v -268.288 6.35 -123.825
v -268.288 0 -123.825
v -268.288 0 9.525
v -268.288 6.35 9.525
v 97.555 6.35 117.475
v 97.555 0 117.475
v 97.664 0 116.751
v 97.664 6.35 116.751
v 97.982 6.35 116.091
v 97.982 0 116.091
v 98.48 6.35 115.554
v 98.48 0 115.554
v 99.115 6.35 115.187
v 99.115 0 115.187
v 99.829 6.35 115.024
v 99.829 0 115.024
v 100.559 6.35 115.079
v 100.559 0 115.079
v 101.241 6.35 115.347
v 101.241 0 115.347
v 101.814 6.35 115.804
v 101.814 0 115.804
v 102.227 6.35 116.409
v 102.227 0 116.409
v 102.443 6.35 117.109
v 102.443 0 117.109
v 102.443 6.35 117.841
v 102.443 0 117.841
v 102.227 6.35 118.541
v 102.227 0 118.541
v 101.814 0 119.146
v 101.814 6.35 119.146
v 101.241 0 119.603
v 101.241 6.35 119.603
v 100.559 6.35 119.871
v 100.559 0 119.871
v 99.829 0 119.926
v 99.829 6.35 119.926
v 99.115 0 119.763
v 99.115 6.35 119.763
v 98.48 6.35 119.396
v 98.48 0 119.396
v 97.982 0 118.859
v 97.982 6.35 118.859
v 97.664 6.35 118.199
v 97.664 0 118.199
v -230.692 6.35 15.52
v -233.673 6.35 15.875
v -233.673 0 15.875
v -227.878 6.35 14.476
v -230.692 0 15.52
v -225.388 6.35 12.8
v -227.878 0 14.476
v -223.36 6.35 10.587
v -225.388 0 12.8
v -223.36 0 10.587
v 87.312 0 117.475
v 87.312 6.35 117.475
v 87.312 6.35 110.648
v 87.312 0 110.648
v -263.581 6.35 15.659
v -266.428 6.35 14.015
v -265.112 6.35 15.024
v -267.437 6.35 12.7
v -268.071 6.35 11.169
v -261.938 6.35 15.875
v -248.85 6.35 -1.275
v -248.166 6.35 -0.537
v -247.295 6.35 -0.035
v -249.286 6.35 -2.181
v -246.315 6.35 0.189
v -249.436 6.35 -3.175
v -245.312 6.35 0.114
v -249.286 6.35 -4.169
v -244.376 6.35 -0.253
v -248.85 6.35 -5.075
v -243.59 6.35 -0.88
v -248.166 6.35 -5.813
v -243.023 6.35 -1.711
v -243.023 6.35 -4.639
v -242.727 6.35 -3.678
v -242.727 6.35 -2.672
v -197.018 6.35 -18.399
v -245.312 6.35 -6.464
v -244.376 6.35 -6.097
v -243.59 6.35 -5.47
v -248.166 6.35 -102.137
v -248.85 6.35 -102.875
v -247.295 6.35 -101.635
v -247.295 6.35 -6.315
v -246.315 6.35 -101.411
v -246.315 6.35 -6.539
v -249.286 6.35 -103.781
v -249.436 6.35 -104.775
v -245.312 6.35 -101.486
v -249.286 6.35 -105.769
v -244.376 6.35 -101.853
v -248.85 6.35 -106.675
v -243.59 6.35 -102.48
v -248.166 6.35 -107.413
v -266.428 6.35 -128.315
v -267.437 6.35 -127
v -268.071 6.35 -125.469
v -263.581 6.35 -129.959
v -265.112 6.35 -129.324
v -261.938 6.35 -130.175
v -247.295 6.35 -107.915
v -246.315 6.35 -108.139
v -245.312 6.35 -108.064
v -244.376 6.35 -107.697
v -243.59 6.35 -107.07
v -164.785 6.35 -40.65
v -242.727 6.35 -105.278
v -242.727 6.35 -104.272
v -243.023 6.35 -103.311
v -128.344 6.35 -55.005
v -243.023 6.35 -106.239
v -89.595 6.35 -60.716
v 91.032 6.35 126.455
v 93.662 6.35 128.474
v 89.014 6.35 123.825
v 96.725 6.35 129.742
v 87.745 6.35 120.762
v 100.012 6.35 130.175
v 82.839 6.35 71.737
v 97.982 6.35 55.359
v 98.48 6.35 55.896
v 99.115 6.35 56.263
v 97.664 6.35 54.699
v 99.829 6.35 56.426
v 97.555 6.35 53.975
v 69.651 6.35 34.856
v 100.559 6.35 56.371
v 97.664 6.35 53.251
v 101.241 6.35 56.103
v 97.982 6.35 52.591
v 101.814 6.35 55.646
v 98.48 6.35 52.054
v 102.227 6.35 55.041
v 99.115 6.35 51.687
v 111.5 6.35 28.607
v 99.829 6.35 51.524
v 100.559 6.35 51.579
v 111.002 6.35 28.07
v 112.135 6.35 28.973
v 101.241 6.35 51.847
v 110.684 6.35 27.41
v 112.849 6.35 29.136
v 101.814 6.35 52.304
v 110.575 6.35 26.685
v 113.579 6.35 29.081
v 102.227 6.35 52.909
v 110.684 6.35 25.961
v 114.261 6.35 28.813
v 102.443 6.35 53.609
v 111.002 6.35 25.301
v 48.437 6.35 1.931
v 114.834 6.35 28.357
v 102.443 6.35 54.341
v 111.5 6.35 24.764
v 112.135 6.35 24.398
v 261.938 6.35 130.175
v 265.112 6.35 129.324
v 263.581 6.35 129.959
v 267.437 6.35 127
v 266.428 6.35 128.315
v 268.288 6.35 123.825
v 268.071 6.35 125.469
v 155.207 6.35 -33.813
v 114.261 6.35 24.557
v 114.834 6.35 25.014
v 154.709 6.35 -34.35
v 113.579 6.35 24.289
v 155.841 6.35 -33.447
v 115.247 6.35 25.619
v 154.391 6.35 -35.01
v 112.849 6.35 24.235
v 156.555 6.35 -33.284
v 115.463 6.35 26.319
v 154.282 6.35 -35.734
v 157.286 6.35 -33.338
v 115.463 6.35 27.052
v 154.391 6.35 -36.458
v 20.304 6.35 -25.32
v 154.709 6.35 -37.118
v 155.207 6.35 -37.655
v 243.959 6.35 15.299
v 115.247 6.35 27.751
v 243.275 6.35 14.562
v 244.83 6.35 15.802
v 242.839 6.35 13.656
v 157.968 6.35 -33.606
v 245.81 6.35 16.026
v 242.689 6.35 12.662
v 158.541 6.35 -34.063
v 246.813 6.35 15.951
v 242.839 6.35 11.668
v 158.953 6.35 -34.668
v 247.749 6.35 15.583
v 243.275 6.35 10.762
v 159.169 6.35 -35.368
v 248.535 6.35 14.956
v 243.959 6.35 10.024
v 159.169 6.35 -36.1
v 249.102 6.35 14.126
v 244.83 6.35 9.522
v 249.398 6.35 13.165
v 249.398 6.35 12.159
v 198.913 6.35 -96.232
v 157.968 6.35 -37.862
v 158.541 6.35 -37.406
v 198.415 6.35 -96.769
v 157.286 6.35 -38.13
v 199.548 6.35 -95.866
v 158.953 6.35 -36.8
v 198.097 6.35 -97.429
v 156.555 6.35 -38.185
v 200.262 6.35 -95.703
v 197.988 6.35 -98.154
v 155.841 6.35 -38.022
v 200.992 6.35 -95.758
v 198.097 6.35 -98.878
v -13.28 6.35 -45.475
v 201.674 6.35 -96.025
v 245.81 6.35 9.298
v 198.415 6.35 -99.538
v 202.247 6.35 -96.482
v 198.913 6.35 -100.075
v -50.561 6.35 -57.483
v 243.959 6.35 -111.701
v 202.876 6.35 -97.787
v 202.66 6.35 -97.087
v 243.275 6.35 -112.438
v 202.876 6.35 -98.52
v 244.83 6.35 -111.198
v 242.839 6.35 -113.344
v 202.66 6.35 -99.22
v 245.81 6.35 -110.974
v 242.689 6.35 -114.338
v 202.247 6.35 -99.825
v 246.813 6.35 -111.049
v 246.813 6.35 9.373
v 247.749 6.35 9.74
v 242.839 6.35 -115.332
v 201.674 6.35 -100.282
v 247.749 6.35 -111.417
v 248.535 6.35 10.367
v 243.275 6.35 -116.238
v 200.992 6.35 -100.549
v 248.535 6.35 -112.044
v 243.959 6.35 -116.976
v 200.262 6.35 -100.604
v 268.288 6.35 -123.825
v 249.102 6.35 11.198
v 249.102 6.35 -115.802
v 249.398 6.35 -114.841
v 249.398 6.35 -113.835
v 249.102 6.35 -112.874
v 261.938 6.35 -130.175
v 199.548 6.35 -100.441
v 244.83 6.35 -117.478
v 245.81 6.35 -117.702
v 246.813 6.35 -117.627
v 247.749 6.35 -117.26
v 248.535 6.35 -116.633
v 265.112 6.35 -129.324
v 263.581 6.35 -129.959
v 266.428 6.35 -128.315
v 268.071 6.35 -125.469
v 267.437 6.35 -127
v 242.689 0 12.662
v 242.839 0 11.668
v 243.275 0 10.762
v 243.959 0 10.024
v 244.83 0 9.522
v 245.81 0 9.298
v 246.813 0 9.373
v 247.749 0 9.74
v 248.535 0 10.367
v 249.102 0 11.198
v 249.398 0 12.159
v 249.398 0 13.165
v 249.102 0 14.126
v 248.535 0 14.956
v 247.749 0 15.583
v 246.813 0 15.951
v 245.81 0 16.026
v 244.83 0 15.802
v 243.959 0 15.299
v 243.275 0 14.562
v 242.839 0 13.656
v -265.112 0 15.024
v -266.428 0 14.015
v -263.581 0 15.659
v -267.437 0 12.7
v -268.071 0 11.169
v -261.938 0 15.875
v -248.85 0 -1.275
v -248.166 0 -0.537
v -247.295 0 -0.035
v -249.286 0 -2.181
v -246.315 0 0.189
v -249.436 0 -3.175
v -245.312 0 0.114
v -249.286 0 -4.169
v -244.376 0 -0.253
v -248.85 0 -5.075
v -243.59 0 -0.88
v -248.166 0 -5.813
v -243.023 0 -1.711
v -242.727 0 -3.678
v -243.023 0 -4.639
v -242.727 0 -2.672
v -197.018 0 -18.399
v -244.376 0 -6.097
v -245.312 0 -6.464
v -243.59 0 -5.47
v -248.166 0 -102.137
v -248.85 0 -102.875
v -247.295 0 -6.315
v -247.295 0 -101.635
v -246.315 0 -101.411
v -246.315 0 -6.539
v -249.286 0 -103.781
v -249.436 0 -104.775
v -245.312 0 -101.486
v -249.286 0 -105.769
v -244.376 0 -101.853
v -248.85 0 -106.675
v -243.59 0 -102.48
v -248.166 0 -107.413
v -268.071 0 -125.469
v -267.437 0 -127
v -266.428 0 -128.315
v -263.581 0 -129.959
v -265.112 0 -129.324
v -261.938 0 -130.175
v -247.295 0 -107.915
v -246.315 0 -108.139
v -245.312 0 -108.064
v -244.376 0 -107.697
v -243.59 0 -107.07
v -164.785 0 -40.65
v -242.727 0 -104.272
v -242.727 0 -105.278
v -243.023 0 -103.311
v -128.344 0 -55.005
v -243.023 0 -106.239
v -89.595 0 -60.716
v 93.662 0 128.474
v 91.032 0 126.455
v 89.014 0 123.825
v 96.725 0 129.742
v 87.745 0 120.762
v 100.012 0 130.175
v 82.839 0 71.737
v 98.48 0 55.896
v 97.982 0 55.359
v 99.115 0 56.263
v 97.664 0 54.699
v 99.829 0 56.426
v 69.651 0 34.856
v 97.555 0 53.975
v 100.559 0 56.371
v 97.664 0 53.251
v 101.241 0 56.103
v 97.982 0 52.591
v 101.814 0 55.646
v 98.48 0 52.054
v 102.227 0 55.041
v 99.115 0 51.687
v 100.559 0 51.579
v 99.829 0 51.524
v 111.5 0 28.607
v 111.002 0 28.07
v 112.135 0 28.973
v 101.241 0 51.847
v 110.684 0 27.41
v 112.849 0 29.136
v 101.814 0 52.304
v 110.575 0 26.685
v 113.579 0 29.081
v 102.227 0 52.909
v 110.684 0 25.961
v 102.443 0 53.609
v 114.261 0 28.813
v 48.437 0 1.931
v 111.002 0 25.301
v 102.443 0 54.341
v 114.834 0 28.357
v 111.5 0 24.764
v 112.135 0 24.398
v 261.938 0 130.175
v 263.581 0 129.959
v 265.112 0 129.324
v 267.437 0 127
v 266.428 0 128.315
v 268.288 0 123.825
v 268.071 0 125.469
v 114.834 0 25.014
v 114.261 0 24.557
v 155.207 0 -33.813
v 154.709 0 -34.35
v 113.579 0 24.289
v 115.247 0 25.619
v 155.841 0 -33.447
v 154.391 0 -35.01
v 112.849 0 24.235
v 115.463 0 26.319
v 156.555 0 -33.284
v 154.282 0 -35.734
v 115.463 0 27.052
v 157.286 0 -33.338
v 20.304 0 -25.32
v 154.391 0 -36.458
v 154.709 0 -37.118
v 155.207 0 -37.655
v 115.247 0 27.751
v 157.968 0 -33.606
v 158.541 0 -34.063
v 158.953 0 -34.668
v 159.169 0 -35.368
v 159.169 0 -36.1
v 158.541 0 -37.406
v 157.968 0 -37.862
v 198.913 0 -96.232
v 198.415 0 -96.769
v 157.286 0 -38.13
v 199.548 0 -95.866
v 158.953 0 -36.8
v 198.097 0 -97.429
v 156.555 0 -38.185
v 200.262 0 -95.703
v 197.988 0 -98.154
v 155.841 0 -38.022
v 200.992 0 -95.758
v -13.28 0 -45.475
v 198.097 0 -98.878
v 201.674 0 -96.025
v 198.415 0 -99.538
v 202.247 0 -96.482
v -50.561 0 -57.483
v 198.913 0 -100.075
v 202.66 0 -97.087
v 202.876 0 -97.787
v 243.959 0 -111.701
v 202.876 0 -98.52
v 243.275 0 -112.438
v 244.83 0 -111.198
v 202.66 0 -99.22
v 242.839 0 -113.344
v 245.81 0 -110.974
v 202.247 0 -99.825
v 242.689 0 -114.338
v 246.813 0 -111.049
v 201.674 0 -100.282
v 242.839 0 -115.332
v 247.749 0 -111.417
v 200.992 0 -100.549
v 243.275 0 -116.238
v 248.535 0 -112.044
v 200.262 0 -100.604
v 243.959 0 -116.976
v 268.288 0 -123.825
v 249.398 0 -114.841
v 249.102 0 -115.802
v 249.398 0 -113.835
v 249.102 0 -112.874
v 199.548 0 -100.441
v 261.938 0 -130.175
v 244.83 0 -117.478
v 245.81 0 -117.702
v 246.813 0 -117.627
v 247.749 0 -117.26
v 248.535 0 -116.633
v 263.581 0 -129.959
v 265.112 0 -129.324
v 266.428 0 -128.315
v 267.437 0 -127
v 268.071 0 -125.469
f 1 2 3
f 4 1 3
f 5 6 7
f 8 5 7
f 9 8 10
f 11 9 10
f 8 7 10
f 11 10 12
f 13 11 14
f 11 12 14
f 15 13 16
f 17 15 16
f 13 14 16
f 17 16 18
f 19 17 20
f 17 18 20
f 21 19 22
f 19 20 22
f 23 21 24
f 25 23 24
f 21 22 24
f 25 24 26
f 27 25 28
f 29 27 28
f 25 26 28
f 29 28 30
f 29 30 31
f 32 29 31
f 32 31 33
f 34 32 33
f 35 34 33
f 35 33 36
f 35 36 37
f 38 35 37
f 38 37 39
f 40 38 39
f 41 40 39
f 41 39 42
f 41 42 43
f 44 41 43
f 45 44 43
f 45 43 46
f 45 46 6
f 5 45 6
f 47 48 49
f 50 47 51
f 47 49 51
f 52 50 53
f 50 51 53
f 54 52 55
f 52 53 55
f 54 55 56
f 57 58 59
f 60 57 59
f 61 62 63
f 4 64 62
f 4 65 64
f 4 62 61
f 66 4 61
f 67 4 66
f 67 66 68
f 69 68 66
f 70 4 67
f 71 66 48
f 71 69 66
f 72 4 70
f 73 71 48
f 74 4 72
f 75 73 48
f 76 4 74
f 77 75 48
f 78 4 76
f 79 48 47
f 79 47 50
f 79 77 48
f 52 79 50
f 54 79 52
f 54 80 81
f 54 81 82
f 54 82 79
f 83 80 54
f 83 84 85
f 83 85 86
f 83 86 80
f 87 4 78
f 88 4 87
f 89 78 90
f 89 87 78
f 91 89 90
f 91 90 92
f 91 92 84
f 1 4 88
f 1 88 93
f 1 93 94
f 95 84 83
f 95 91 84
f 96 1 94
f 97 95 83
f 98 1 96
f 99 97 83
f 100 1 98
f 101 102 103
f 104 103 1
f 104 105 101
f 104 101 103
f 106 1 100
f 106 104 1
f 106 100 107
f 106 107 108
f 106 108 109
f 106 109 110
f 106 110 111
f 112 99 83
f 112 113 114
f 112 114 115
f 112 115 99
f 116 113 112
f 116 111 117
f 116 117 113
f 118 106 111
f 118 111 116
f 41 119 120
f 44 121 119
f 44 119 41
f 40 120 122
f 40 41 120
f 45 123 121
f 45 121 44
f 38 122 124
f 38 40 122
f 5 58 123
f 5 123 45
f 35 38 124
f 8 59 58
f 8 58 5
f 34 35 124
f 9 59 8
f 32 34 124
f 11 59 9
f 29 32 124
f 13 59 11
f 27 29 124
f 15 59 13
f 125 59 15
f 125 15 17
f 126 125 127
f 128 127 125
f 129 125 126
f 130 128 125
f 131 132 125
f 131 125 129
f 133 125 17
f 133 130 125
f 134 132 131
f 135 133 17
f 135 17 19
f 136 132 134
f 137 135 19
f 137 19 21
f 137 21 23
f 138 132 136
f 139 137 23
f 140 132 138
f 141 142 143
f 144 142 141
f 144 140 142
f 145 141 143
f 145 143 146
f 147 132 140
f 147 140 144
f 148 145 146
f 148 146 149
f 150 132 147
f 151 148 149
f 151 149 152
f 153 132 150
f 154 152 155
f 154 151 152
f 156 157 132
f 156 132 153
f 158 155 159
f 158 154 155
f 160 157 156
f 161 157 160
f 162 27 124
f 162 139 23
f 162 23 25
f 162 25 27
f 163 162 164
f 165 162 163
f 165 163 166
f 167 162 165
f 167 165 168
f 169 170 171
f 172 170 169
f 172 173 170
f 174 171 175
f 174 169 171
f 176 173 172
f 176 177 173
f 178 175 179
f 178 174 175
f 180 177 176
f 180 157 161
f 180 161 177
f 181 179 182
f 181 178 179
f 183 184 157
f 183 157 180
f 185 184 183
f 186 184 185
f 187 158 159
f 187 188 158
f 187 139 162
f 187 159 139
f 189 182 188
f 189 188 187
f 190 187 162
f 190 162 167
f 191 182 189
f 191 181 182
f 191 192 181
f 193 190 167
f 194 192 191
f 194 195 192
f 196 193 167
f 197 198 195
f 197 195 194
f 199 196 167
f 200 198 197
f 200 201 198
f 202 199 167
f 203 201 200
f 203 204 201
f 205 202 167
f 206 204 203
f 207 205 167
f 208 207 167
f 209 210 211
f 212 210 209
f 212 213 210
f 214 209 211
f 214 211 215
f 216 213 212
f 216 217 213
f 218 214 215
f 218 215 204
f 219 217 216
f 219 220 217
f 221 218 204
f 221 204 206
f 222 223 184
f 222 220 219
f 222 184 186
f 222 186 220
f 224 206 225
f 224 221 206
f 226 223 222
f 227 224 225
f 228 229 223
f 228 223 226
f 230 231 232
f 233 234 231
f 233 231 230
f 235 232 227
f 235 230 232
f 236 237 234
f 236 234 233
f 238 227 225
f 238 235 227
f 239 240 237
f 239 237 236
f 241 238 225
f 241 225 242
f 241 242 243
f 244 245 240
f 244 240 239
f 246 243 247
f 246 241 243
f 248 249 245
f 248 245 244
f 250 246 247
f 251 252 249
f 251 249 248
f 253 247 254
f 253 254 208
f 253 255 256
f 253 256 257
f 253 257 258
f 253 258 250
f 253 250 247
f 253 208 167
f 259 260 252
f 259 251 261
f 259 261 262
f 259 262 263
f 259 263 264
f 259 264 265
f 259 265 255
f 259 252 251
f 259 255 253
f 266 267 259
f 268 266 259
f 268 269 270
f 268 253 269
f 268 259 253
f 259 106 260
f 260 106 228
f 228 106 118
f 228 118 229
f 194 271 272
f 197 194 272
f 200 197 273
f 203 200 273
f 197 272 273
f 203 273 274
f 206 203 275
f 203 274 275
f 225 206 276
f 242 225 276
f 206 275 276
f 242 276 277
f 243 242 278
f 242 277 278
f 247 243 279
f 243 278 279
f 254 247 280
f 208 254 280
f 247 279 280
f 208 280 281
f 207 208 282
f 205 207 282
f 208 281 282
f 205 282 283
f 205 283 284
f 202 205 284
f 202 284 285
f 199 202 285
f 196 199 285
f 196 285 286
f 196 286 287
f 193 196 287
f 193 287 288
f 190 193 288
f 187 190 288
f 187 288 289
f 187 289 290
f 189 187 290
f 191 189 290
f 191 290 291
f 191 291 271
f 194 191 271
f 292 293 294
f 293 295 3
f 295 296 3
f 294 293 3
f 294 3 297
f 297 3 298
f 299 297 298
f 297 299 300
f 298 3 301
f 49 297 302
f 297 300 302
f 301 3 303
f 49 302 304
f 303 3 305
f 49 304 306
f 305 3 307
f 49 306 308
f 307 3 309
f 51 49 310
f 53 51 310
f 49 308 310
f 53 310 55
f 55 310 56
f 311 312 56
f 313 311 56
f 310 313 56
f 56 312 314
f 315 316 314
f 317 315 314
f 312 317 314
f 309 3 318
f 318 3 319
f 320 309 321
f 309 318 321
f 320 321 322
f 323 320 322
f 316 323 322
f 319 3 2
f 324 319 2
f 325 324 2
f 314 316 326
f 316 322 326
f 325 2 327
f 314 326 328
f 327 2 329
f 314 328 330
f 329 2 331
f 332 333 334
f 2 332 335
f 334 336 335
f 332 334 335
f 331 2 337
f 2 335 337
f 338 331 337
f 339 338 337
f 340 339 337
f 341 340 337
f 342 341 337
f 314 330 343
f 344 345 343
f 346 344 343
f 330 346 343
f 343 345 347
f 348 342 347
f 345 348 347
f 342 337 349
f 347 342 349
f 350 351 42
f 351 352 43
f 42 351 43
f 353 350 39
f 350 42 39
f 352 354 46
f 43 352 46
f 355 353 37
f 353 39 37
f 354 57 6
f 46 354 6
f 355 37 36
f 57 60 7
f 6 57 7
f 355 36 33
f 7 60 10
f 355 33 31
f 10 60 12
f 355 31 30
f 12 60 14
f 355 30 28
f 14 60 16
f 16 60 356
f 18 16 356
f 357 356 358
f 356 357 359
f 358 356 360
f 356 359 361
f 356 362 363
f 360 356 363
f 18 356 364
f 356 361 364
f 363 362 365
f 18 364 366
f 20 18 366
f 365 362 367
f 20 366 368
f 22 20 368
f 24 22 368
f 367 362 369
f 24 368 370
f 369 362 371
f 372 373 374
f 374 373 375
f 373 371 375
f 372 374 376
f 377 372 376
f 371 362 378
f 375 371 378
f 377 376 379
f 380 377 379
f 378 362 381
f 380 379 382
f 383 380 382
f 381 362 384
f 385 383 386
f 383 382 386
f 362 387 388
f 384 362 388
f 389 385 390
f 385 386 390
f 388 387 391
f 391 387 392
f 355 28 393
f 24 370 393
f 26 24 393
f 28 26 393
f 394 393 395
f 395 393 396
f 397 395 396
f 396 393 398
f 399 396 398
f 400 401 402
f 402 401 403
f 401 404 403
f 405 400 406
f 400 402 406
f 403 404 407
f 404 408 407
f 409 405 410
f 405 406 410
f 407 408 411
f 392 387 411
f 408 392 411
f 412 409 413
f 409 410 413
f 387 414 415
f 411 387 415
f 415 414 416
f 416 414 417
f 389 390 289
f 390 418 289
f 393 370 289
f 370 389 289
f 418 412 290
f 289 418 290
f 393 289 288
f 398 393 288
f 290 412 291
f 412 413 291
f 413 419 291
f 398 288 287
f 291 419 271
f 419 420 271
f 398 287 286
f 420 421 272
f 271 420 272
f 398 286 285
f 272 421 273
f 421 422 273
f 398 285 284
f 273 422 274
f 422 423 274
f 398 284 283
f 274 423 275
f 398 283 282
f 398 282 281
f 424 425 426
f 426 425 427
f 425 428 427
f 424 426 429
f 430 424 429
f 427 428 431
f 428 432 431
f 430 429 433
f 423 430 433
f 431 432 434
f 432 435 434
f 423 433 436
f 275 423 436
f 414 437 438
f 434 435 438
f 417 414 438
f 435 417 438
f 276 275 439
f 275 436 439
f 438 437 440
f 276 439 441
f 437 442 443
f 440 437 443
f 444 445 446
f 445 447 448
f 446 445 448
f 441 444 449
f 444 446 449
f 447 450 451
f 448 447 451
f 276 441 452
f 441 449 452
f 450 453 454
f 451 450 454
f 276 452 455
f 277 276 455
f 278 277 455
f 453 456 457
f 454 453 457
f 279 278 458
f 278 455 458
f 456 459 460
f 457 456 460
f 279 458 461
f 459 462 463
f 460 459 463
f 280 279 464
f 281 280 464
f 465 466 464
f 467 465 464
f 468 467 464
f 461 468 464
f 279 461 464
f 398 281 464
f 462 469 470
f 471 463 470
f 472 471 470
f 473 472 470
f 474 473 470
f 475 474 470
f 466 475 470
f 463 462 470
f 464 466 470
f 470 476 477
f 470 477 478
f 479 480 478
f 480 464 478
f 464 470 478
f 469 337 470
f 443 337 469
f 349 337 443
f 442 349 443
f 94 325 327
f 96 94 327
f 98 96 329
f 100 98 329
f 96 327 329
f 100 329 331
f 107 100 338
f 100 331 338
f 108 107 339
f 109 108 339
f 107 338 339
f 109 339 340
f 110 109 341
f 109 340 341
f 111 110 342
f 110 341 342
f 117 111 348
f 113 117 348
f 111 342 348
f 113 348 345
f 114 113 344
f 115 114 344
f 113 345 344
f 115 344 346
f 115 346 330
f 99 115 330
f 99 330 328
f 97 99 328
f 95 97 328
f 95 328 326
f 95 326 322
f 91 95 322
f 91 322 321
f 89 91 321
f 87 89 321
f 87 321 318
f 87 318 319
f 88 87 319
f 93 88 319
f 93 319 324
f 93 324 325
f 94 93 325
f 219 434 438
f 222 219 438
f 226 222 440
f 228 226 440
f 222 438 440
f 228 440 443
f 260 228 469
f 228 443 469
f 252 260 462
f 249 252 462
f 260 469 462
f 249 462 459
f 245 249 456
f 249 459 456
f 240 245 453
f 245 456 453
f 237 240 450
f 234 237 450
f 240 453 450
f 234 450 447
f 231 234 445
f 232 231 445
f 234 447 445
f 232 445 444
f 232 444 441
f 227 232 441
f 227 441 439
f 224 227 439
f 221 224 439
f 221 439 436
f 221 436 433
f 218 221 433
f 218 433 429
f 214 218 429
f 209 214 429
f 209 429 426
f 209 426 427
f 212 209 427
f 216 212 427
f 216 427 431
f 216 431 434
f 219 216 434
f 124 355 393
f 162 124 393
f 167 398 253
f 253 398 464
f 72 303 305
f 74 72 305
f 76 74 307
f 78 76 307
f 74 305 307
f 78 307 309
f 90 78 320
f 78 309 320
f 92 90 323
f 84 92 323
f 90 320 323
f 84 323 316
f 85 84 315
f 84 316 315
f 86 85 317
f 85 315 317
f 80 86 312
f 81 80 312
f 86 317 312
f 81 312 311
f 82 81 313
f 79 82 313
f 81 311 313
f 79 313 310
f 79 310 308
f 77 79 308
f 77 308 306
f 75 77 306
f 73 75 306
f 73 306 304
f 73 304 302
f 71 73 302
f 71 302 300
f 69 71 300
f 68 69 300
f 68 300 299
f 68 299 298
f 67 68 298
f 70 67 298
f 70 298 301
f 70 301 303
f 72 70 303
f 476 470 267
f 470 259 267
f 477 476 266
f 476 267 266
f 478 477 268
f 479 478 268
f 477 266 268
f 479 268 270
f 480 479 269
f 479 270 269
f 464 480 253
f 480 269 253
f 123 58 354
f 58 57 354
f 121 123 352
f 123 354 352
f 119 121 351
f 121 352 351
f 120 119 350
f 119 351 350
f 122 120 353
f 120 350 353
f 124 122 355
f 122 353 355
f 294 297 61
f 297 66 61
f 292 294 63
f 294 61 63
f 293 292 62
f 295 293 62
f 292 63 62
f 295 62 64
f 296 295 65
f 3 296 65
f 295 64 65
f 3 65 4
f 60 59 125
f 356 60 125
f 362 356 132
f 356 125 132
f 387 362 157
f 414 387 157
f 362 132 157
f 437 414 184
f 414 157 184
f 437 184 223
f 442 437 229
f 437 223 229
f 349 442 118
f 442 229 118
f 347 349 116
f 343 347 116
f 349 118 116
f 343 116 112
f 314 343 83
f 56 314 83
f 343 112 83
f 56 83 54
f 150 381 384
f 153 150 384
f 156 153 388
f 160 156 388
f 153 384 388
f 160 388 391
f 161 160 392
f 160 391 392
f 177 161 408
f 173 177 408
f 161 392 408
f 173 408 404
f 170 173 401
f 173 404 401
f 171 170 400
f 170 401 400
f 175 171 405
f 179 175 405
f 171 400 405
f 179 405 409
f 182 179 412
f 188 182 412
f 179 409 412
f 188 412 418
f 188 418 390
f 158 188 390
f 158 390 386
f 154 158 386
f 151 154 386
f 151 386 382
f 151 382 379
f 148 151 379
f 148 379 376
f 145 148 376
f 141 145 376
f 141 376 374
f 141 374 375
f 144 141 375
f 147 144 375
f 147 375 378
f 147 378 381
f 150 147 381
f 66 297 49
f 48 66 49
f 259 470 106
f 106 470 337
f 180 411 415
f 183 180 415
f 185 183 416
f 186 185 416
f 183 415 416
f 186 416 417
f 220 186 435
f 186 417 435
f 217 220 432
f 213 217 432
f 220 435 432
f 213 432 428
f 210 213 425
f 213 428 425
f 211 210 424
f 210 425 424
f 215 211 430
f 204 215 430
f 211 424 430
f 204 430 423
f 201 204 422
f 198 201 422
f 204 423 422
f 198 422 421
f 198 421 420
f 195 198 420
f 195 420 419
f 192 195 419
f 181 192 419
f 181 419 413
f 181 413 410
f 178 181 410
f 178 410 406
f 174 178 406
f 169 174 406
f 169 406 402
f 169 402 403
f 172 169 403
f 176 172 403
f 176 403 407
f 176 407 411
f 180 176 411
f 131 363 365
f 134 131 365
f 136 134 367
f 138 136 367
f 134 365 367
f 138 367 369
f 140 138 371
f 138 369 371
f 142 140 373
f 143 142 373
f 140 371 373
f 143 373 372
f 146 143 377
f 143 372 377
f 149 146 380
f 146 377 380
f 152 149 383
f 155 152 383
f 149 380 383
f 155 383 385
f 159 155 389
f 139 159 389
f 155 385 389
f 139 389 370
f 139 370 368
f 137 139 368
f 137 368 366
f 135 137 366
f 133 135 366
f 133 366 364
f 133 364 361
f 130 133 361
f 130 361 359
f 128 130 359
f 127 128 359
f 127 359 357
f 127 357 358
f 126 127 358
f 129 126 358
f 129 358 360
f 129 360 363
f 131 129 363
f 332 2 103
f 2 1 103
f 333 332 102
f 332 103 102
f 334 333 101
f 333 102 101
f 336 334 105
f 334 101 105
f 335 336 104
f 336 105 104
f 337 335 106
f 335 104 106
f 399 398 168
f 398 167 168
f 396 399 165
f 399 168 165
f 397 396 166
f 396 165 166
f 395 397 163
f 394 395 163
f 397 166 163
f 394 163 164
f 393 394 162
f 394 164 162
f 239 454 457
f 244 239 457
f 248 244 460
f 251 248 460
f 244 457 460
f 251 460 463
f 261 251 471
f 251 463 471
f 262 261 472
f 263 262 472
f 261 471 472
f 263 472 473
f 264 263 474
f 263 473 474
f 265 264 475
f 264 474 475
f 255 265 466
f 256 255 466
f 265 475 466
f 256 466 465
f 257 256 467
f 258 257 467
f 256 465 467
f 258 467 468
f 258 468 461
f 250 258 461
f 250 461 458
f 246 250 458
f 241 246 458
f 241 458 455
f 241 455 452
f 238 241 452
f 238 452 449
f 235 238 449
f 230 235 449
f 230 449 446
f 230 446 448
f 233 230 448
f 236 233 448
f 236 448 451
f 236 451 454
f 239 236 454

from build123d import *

# Parameters (mm, degrees)
BOSS_EXTRUDE1_DEPTH              = 6.35
F_17_64_0_26563_DIAMETER_HOLE1_D = 6.747002
FILLET1_R                        = 6.35
F_10_0_1935_DIAMETER_HOLE1_D     = 4.9149
SKETCH8_R                        = 3.373501
CUT_EXTRUDE1_DEPTH               = 299.268395545
FILLET2_R                        = 12.7


with BuildPart() as part:
    # Sketch1 → Boss-Extrude1 (new body)
    with BuildSketch(Plane(origin=(0, 0, 0), x_dir=(1, 0, 0), z_dir=(0, 1, 0))):
        with BuildLine():
            Line((-268.2875, -15.875), (-233.3625, -15.875))
            ThreePointArc((-233.3625, -15.875), (-228.872371939, -17.734871939), (-227.0125, -22.225))
            Line((-227.0125, -22.225), (-227.0125, -130.175))
            Line((-227.0125, -130.175), (268.2875, -130.175))
            Line((268.2875, -130.175), (268.2875, 130.175))
            Line((268.2875, 130.175), (-268.2875, 130.175))
            Line((-268.2875, 130.175), (-268.2875, -15.875))
        make_face()
    extrude(amount=BOSS_EXTRUDE1_DEPTH)

    # 17/64 (0.26563) Diameter Hole1 (through all)
    with Locations(Plane(origin=(0, 6.35, 0), x_dir=(1, 0, 0), z_dir=(0, 1, 0))):
        with Locations((-246.0625, 104.775), (-246.0625, 3.175), (-220.6625, -53.975), (-220.6625, -117.475), (246.0625, 114.3381), (246.0625, -12.6619)):
            Hole(F_17_64_0_26563_DIAMETER_HOLE1_D / 2)

    # Fillet1
    fillet1_edges = [part.edges().sort_by_distance(p)[0] for p in [
        (268.2875, 3.175, 130.175),
        (-227.0125, 3.175, 130.175),
        (-268.2875, 3.175, 15.875),
        (-268.2875, 3.175, -130.175),
        (268.2875, 3.175, -130.175),
    ]]
    fillet(fillet1_edges, radius=FILLET1_R)

    # #10 (0.1935) Diameter Hole1 (through all)
    with Locations(Plane(origin=(0, 6.35, 0), x_dir=(1, 0, 0), z_dir=(0, 1, 0))):
        with Locations((200.4455889, 98.15353155), (156.73906445, 35.734145775), (113.03254, -26.68524), (100.0125, -53.975), (100.0125, -117.475)):
            Hole(F_10_0_1935_DIAMETER_HOLE1_D / 2)

    # Sketch8 → Cut-Extrude1 (cut, through all)
    with BuildSketch(Plane(origin=(0, 6.35, 0), x_dir=(1, 0, 0), z_dir=(0, 1, 0))):
        with BuildLine():
            Line((-220.6625, -130.175), (87.3125, -130.175))
            Line((87.3125, -130.175), (87.3125, -110.647553384))
            ThreePointArc((87.3125, -110.647553384), (-34.644148174, 53.50332424), (-227.0125, -15.875))
            Line((-227.0125, -15.875), (-233.3625, -15.875))
            ThreePointArc((-233.3625, -15.875), (-228.872371939, -17.734871939), (-227.0125, -22.225))
            Line((-227.0125, -22.225), (-227.0125, -123.825))
            ThreePointArc((-227.0125, -123.825), (-225.152628061, -128.315128061), (-220.6625, -130.175))
        make_face()
        with Locations((-220.6625, -117.475)):
            Circle(SKETCH8_R, mode=Mode.SUBTRACT)
        with Locations((-220.6625, -53.975)):
            Circle(SKETCH8_R, mode=Mode.SUBTRACT)
    extrude(amount=-CUT_EXTRUDE1_DEPTH, mode=Mode.SUBTRACT)

    # Fillet2
    fillet2_edges = [part.edges().sort_by_distance(p)[0] for p in [
        (-227.0125, 3.175, 15.875),
        (87.3125, 3.175, 130.175),
    ]]
    fillet(fillet2_edges, radius=FILLET2_R)


solid = part.part
